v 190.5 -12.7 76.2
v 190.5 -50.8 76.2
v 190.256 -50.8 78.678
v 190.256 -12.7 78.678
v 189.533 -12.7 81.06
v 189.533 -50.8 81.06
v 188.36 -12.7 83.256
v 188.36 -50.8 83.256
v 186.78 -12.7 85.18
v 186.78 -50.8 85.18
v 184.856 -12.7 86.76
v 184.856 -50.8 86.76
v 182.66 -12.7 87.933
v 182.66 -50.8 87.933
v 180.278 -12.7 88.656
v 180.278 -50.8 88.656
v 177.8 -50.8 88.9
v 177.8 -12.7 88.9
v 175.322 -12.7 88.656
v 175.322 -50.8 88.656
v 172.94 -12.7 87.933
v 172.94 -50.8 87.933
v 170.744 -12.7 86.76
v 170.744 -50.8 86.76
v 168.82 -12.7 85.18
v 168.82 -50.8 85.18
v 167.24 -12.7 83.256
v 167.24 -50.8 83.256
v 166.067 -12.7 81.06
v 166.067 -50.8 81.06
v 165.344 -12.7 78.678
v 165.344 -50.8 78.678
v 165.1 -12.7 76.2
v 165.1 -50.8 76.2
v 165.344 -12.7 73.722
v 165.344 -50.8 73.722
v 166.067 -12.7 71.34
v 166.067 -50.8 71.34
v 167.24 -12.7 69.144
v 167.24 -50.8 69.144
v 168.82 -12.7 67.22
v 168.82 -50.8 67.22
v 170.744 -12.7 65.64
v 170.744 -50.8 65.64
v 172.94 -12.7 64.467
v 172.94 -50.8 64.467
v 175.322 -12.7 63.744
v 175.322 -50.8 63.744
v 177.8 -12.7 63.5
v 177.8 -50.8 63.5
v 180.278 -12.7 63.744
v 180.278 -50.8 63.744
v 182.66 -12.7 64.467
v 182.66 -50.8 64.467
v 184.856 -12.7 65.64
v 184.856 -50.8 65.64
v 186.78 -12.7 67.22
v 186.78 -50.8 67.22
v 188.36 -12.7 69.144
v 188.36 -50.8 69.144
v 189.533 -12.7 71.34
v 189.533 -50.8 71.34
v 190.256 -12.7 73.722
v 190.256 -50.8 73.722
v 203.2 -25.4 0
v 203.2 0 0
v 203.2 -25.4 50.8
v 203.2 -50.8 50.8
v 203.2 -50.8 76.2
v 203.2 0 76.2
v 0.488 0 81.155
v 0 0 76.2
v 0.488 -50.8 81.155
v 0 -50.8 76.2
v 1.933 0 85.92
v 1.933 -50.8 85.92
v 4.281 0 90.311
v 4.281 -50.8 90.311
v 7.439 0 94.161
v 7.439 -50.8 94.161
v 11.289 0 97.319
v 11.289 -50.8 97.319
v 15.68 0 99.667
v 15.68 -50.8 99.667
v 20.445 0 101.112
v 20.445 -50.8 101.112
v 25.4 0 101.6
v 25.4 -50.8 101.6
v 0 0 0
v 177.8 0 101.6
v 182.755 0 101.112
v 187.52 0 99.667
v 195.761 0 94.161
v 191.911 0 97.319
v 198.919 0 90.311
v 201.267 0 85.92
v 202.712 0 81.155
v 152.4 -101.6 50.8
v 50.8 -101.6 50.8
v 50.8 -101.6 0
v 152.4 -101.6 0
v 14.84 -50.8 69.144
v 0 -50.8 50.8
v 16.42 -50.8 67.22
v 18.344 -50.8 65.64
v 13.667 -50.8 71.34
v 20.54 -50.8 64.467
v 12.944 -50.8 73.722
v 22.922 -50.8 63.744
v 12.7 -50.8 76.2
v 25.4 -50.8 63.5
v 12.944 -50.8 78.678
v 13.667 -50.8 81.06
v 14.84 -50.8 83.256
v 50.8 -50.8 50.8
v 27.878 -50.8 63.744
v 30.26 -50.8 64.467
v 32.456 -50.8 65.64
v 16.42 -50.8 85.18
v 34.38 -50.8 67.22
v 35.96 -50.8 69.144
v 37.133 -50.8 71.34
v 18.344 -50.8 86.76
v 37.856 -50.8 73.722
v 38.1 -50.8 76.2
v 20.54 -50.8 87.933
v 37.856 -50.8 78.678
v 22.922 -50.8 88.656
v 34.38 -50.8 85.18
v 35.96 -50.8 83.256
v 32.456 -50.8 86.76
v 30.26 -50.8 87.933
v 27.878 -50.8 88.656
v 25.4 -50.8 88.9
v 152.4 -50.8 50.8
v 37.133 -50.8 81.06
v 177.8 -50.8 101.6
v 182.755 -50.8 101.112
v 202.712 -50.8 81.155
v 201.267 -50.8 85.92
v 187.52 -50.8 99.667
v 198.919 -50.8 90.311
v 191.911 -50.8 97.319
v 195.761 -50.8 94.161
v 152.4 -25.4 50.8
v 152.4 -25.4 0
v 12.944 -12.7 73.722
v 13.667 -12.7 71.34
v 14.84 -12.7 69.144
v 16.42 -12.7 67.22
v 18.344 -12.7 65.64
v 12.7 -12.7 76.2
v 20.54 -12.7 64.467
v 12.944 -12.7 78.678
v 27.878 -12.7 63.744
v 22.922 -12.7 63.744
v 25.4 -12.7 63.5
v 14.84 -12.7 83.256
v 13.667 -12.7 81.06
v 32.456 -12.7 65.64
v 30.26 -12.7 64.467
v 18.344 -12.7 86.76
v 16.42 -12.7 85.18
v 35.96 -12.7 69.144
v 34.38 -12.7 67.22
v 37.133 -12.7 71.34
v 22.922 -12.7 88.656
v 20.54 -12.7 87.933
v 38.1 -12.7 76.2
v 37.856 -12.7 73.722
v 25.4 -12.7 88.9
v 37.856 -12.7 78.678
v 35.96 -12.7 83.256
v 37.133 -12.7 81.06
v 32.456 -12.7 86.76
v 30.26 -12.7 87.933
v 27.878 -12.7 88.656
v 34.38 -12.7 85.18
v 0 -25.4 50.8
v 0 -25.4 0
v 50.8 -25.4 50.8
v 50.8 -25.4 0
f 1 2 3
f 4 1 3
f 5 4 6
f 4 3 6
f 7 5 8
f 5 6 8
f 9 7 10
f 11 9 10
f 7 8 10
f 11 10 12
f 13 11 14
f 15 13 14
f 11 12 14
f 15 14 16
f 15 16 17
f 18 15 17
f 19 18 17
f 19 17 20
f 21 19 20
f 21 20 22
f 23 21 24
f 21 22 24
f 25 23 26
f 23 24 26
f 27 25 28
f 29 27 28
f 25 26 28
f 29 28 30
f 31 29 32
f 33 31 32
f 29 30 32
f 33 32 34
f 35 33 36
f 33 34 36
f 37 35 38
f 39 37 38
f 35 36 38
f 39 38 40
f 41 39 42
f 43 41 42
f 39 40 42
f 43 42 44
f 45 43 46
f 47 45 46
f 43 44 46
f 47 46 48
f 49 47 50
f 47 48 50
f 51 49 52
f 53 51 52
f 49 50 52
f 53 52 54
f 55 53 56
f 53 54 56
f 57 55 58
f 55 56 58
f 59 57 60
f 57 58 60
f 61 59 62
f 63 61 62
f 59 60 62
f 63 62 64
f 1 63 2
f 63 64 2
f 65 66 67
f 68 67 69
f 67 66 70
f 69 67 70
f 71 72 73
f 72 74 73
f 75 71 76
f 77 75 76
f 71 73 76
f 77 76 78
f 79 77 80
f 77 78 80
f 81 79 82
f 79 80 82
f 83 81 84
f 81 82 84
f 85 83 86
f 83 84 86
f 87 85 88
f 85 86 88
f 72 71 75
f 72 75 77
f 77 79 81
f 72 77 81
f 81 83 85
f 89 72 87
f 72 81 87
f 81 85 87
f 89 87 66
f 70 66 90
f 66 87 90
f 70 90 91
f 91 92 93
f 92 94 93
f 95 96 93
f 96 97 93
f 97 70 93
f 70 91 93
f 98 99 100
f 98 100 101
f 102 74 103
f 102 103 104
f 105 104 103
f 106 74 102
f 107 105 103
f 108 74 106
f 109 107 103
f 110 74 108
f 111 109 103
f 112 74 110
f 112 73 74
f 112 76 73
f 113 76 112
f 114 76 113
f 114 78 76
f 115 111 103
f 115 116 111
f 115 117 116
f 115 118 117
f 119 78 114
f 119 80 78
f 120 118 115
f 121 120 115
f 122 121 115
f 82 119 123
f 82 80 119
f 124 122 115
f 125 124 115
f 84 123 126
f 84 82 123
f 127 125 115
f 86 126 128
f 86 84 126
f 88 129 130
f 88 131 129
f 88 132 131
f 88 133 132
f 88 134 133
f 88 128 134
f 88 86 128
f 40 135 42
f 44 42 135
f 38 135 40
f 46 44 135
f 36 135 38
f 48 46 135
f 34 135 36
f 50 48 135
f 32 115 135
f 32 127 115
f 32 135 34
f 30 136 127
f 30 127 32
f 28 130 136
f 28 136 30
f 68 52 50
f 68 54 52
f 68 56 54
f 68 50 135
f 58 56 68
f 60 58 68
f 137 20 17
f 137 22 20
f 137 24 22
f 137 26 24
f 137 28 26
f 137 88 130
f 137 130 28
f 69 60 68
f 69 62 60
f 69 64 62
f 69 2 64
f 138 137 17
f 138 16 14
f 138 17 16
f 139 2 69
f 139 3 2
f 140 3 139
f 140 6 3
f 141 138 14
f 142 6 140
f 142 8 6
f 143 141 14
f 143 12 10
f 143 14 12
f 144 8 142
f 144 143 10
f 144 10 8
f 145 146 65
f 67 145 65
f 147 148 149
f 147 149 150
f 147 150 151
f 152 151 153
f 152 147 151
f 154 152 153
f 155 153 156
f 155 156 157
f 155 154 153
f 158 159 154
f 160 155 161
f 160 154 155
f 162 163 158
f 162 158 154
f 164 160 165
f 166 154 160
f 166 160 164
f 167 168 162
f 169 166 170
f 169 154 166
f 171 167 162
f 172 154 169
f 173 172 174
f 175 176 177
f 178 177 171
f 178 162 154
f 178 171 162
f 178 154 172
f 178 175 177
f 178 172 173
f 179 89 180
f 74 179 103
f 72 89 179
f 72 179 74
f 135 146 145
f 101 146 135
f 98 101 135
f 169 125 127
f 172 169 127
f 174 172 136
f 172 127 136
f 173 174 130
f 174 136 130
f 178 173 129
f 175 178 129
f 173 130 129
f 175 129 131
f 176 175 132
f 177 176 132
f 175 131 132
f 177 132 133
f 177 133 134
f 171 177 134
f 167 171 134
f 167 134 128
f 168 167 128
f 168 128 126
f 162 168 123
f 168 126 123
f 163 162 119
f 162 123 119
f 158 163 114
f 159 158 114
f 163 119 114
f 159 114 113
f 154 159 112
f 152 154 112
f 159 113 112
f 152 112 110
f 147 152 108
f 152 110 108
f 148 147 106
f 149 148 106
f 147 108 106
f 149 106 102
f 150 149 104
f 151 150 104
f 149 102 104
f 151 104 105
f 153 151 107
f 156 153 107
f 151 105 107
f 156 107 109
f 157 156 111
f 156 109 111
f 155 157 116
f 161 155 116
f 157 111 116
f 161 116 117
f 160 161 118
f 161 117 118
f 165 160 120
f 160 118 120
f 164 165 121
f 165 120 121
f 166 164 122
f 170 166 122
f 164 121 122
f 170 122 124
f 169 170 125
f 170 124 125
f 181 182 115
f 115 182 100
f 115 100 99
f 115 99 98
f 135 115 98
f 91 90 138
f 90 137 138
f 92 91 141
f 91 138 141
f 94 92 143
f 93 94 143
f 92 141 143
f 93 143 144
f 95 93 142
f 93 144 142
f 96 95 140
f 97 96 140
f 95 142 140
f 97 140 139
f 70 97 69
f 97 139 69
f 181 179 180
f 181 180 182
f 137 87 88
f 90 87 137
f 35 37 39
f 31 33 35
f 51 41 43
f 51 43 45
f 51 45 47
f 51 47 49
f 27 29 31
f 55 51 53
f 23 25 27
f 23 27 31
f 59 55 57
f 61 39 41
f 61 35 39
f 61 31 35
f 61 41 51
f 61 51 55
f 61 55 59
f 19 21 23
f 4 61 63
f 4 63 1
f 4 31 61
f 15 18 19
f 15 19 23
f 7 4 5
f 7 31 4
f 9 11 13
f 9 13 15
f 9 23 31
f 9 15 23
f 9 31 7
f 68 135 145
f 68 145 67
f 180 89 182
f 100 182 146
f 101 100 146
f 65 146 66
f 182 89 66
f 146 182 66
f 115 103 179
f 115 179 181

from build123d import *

# Parameters (mm, degrees)
F0_W     = 203.2
F0_H     = 101.6
F1_DEPTH = 101.6
F2_W     = 50.8
F2_H     = 50.8
F3_DEPTH = 76.2
F5_DEPTH = 50.8
F6_R     = 25.4
F7_R     = 12.7
F8_DEPTH = 38.1


with BuildPart() as f1:
    # F0 (on Front) → F1 (new body)
    with BuildSketch(Plane.XZ):
        with Locations((101.6, 50.8)):
            Rectangle(F0_W, F0_H)
    extrude(amount=F1_DEPTH)

    # F2 (on face) → F3 (cut)
    with BuildSketch(Plane.XZ.offset(101.6)):
        with Locations((25.4, 25.4)):
            Rectangle(F2_W, F2_H)
        with Locations((177.8, 25.4)):
            Rectangle(F2_W, F2_H)
    extrude(amount=-F3_DEPTH, mode=Mode.SUBTRACT)

    # F4 (on face) → F5 (cut)
    with BuildSketch(Plane.XZ.offset(101.6)):
        Polygon((0, 50.8), (50.8, 50.8), (152.4, 50.8), (203.2, 50.8), (203.2, 101.6), (0, 101.6), align=None)
    extrude(amount=-F5_DEPTH, mode=Mode.SUBTRACT)

    # F6
    f6_edges = [f1.edges().sort_by_distance(p)[0] for p in [
        (203.2, -25.4, 101.6),
        (0, -25.4, 101.6),
    ]]
    fillet(f6_edges, radius=F6_R)

    # F7 (on face) → F8 (cut)
    with BuildSketch(Plane.XZ.offset(50.8)):
        with Locations((25.4, 76.2)):
            Circle(F7_R)
        with Locations((177.8, 76.2)):
            Circle(F7_R)
    extrude(amount=-F8_DEPTH, mode=Mode.SUBTRACT)


solid = f1.part
